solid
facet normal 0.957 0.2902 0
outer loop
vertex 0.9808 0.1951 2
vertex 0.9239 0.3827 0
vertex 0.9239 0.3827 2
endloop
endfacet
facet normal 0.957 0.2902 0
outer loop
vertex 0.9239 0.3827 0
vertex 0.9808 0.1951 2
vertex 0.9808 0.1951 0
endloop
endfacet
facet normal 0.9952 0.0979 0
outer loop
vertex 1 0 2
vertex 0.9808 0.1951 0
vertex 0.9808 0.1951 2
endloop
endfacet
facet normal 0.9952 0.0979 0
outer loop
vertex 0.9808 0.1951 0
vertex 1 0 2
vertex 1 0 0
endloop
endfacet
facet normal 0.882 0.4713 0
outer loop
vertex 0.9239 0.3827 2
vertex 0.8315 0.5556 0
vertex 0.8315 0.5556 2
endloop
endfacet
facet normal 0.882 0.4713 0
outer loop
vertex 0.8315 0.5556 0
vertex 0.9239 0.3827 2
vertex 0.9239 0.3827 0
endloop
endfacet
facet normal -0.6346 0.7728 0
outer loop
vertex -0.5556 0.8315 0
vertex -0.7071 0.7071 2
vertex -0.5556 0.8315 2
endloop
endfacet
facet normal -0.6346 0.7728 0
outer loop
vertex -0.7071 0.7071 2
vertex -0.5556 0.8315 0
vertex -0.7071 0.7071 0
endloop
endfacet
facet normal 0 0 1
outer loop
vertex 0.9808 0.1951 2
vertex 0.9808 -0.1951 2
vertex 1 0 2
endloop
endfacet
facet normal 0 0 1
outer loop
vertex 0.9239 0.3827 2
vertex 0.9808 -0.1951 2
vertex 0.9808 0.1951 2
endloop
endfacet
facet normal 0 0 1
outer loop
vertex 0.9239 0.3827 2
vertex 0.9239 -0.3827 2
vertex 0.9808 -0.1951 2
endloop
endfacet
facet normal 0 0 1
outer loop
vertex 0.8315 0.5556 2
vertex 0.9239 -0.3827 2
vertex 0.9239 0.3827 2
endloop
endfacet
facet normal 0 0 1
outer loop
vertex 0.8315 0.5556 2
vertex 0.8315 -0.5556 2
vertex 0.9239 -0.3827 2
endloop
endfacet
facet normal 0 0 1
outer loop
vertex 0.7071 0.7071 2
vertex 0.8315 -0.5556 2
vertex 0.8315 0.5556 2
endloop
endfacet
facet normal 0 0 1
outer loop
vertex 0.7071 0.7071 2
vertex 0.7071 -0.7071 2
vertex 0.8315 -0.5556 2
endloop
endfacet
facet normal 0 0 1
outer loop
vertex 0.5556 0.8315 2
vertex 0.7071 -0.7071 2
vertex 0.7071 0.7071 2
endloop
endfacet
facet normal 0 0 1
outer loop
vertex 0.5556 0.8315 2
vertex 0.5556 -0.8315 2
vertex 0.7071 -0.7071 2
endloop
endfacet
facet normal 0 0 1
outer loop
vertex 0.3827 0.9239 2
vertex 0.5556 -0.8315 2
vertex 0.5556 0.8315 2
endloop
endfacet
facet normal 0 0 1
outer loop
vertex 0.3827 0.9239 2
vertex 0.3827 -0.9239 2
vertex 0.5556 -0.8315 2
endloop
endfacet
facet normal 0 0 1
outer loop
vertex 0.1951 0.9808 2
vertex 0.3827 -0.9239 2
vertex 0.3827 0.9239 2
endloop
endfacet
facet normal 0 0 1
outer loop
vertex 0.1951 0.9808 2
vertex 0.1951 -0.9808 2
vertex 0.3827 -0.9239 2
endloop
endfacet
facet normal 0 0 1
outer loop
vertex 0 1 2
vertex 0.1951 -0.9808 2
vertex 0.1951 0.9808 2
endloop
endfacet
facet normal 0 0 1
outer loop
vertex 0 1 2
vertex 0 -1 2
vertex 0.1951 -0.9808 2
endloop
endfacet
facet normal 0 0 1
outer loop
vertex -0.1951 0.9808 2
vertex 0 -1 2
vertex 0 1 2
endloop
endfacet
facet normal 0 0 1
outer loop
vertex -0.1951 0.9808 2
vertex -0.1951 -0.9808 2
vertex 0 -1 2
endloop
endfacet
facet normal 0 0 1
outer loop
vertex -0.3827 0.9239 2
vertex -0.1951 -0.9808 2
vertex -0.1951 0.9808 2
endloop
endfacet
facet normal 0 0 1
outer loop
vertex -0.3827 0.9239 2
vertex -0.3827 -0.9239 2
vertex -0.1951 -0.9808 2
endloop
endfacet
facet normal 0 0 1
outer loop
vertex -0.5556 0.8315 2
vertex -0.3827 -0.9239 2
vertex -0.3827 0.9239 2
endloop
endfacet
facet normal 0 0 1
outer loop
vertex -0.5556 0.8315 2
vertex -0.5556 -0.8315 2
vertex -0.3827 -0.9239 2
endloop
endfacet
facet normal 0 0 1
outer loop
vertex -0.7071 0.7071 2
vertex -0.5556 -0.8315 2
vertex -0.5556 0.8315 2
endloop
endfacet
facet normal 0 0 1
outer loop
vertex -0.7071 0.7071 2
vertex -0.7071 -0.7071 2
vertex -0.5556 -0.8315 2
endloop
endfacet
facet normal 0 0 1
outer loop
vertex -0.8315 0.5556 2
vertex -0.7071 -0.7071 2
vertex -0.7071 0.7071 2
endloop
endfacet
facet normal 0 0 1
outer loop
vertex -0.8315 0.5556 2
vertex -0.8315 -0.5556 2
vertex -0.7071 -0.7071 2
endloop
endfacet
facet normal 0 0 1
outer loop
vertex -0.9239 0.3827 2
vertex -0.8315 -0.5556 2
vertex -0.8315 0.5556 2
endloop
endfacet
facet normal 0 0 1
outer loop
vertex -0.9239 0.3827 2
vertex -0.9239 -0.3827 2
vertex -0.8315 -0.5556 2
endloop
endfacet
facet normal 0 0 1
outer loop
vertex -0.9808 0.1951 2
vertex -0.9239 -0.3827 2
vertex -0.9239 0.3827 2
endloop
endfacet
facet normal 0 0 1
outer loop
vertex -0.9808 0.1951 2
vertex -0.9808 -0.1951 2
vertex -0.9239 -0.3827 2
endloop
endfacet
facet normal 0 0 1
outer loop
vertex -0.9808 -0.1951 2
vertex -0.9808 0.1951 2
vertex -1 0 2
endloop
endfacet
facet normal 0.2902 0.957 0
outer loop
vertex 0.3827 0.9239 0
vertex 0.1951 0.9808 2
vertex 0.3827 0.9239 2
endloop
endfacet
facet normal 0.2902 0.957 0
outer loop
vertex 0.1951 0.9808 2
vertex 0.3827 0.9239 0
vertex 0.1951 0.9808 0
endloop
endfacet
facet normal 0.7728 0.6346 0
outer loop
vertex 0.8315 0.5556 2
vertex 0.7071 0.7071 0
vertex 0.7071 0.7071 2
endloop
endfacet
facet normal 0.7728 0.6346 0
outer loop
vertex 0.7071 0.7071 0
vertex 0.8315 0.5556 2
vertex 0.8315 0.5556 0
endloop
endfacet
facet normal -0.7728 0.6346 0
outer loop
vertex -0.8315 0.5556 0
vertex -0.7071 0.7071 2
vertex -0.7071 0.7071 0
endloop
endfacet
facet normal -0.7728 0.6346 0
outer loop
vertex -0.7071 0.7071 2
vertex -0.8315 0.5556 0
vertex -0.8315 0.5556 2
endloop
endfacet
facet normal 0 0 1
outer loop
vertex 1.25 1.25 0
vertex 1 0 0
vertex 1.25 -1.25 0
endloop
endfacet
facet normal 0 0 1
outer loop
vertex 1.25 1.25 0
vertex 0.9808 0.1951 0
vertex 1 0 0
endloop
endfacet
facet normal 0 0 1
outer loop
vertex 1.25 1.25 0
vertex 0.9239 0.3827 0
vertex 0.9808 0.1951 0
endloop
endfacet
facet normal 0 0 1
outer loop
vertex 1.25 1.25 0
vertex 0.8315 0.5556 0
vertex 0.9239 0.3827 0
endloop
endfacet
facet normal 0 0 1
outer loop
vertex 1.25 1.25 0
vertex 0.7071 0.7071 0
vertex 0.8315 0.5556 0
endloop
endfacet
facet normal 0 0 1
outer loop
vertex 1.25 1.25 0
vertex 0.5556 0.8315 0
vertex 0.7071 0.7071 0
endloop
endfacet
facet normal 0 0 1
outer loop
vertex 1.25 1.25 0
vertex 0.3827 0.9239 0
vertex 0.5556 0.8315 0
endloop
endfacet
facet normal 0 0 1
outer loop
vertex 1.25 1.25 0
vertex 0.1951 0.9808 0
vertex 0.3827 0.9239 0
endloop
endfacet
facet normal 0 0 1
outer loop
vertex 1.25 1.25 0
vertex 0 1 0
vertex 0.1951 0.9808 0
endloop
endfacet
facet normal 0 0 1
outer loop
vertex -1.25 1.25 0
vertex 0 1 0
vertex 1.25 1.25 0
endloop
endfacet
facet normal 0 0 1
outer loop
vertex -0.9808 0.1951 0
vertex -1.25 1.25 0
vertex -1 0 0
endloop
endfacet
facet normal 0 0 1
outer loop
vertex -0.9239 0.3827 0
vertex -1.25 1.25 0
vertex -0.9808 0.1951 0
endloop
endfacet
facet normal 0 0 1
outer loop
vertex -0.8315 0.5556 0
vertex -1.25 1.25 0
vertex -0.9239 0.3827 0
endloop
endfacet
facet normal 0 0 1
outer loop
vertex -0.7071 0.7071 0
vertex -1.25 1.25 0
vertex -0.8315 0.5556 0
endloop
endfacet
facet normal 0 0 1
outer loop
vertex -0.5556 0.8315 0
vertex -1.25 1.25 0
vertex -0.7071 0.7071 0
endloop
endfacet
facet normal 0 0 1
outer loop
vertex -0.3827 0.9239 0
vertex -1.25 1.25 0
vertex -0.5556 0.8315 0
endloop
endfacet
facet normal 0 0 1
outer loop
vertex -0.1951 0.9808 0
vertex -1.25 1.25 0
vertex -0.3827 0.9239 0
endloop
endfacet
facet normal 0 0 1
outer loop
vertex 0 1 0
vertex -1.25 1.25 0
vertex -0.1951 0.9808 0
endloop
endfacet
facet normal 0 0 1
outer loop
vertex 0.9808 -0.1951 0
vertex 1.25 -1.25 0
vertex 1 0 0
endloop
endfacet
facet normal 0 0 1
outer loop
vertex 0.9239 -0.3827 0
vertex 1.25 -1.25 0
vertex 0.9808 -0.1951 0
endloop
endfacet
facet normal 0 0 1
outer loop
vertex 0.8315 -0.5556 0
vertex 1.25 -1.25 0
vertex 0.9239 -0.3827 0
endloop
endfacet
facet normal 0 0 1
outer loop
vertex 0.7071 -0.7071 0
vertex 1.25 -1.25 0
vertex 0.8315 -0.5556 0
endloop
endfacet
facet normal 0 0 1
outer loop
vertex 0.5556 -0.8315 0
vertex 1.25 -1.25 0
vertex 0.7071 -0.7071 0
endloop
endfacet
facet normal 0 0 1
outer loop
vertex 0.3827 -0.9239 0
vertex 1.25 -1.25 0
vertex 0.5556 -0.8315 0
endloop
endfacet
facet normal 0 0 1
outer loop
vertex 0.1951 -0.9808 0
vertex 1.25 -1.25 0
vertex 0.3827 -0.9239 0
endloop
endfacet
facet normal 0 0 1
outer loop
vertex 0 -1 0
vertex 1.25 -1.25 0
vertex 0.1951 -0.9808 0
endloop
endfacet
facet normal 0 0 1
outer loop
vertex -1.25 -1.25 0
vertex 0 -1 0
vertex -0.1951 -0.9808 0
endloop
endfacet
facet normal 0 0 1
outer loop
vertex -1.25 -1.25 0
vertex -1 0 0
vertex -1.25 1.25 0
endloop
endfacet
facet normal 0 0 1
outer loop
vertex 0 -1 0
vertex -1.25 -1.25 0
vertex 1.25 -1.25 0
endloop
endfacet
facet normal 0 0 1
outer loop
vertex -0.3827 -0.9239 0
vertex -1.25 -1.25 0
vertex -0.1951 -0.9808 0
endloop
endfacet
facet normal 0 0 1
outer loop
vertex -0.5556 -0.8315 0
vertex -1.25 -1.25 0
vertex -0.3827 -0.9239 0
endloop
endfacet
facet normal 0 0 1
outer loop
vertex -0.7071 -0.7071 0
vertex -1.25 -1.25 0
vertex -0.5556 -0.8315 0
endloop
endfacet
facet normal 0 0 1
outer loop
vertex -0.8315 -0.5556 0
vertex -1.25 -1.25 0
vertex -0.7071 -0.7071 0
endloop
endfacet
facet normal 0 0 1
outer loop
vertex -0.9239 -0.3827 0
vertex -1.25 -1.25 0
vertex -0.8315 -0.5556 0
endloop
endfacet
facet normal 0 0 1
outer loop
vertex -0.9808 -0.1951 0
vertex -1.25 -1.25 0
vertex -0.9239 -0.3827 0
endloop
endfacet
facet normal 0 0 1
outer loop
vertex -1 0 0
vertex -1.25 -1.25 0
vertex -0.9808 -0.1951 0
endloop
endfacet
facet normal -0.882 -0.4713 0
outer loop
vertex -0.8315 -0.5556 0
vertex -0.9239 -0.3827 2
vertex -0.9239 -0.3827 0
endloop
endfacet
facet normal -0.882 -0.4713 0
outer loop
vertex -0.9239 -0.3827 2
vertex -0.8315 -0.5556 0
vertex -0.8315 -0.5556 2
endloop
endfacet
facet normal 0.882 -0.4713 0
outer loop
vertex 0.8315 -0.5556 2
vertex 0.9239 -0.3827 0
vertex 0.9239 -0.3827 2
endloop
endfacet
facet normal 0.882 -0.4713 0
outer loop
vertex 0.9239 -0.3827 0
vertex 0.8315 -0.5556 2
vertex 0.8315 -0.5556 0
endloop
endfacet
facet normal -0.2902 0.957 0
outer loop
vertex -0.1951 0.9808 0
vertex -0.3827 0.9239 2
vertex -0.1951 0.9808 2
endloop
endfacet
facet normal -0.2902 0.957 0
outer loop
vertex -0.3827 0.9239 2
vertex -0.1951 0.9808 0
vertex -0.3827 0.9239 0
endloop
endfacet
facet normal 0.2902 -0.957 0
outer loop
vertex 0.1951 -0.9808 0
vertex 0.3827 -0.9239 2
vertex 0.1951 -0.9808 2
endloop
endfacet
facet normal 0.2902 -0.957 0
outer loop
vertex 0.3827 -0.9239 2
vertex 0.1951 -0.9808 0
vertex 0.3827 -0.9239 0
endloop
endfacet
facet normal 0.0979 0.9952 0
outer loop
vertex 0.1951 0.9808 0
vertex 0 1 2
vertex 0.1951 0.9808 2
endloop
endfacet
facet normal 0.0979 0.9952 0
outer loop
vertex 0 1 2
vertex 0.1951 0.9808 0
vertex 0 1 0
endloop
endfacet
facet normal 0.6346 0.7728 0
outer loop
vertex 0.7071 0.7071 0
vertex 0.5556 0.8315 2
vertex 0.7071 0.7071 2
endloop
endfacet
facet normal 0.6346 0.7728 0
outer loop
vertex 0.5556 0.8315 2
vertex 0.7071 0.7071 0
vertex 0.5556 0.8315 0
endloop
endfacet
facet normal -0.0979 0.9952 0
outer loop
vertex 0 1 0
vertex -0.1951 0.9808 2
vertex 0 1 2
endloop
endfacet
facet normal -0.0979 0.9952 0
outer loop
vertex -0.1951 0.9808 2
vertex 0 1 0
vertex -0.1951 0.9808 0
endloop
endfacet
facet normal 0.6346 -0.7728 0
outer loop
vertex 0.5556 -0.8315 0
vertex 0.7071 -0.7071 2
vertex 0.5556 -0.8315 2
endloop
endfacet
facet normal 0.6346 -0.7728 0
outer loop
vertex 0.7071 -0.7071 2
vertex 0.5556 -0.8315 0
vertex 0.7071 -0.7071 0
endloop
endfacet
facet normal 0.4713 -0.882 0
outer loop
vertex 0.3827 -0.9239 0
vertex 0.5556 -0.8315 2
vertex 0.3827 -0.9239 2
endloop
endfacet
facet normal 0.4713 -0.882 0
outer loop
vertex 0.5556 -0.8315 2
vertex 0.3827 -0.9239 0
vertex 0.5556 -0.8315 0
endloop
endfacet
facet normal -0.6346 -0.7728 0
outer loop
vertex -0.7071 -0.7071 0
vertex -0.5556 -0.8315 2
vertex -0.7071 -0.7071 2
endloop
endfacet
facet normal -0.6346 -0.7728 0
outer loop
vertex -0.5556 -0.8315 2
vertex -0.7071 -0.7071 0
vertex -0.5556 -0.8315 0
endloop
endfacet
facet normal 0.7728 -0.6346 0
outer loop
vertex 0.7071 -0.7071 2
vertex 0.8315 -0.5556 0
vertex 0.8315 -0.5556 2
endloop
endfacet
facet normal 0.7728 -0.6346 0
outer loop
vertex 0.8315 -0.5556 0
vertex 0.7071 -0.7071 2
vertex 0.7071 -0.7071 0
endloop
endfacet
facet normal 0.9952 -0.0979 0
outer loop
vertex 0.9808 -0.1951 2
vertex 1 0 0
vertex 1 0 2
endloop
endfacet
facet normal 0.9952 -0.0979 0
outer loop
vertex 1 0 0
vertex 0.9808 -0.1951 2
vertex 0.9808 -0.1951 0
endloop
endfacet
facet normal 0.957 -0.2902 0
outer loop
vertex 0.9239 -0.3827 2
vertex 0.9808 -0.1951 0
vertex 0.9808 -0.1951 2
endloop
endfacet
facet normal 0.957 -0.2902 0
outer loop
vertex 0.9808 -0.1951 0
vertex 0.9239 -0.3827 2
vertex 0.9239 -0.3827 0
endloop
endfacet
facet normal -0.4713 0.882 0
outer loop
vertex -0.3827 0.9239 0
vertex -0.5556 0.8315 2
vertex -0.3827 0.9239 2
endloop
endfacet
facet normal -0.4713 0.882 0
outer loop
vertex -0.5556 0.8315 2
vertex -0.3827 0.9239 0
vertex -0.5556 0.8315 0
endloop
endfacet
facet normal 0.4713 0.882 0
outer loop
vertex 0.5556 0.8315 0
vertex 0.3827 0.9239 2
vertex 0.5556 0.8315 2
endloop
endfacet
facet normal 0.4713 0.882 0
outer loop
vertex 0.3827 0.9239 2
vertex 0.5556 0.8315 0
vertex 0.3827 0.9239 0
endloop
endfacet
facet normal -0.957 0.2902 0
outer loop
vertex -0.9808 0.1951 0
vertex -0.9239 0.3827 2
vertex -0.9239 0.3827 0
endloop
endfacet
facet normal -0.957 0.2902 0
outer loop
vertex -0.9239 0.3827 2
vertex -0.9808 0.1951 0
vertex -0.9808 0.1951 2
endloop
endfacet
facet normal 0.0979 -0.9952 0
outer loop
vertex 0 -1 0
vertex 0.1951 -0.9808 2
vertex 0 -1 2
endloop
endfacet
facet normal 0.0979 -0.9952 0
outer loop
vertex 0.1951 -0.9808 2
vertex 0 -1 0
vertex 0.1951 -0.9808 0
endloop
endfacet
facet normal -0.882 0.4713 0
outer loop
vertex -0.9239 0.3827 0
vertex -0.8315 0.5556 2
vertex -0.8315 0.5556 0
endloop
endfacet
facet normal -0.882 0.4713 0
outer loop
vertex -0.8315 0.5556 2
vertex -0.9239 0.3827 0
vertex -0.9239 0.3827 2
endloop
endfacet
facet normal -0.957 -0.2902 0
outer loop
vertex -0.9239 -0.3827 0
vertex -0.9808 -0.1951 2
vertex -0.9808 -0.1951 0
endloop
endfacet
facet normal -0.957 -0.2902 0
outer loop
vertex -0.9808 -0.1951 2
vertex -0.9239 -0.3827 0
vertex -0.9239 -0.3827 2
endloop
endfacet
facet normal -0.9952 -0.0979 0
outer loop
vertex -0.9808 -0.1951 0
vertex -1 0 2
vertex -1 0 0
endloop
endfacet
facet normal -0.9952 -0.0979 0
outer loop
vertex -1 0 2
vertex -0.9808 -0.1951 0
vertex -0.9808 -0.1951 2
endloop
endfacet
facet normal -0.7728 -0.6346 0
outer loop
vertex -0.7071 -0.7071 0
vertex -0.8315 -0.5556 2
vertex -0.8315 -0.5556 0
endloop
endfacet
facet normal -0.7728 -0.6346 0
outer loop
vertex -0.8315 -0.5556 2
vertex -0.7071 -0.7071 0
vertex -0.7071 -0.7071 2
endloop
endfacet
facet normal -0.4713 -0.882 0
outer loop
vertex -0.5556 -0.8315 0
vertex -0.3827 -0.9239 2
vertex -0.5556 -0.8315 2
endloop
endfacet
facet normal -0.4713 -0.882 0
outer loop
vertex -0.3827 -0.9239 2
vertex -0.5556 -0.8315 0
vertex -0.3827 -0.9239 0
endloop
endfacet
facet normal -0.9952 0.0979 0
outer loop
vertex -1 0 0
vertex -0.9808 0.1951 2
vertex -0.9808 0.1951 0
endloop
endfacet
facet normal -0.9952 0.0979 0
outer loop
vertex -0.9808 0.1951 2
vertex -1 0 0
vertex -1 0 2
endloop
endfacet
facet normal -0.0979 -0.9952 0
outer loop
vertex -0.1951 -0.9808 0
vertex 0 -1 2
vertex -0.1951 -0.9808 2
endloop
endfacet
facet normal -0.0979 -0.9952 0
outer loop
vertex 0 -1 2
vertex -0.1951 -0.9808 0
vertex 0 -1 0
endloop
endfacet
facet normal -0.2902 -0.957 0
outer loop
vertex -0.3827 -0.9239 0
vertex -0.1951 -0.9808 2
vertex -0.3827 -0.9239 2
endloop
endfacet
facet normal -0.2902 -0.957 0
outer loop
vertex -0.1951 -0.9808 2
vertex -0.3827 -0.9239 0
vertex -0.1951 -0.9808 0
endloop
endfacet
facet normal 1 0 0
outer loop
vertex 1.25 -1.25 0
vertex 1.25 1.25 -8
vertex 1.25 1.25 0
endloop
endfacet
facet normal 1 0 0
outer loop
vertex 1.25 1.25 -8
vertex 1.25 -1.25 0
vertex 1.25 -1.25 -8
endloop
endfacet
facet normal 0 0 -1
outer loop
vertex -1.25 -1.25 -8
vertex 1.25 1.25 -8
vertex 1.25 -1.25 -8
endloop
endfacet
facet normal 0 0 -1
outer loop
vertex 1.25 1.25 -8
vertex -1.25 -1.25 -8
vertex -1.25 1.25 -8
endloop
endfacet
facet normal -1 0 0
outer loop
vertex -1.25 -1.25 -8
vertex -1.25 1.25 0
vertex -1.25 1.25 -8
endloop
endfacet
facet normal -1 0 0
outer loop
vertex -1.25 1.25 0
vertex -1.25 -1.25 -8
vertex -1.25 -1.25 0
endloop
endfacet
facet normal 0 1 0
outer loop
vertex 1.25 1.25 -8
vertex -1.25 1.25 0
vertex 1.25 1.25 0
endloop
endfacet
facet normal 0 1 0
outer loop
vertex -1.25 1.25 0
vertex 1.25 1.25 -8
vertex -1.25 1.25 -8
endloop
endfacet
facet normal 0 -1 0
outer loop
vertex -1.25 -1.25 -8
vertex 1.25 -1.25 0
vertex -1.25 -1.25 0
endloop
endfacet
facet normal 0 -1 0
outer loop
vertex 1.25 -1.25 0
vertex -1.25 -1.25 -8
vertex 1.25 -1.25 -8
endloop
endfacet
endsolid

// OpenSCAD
$fn=32;

cylinder(d=2, h=2);
translate([0, 0, -4])
cube([2.5, 2.5, 8], center=true);
